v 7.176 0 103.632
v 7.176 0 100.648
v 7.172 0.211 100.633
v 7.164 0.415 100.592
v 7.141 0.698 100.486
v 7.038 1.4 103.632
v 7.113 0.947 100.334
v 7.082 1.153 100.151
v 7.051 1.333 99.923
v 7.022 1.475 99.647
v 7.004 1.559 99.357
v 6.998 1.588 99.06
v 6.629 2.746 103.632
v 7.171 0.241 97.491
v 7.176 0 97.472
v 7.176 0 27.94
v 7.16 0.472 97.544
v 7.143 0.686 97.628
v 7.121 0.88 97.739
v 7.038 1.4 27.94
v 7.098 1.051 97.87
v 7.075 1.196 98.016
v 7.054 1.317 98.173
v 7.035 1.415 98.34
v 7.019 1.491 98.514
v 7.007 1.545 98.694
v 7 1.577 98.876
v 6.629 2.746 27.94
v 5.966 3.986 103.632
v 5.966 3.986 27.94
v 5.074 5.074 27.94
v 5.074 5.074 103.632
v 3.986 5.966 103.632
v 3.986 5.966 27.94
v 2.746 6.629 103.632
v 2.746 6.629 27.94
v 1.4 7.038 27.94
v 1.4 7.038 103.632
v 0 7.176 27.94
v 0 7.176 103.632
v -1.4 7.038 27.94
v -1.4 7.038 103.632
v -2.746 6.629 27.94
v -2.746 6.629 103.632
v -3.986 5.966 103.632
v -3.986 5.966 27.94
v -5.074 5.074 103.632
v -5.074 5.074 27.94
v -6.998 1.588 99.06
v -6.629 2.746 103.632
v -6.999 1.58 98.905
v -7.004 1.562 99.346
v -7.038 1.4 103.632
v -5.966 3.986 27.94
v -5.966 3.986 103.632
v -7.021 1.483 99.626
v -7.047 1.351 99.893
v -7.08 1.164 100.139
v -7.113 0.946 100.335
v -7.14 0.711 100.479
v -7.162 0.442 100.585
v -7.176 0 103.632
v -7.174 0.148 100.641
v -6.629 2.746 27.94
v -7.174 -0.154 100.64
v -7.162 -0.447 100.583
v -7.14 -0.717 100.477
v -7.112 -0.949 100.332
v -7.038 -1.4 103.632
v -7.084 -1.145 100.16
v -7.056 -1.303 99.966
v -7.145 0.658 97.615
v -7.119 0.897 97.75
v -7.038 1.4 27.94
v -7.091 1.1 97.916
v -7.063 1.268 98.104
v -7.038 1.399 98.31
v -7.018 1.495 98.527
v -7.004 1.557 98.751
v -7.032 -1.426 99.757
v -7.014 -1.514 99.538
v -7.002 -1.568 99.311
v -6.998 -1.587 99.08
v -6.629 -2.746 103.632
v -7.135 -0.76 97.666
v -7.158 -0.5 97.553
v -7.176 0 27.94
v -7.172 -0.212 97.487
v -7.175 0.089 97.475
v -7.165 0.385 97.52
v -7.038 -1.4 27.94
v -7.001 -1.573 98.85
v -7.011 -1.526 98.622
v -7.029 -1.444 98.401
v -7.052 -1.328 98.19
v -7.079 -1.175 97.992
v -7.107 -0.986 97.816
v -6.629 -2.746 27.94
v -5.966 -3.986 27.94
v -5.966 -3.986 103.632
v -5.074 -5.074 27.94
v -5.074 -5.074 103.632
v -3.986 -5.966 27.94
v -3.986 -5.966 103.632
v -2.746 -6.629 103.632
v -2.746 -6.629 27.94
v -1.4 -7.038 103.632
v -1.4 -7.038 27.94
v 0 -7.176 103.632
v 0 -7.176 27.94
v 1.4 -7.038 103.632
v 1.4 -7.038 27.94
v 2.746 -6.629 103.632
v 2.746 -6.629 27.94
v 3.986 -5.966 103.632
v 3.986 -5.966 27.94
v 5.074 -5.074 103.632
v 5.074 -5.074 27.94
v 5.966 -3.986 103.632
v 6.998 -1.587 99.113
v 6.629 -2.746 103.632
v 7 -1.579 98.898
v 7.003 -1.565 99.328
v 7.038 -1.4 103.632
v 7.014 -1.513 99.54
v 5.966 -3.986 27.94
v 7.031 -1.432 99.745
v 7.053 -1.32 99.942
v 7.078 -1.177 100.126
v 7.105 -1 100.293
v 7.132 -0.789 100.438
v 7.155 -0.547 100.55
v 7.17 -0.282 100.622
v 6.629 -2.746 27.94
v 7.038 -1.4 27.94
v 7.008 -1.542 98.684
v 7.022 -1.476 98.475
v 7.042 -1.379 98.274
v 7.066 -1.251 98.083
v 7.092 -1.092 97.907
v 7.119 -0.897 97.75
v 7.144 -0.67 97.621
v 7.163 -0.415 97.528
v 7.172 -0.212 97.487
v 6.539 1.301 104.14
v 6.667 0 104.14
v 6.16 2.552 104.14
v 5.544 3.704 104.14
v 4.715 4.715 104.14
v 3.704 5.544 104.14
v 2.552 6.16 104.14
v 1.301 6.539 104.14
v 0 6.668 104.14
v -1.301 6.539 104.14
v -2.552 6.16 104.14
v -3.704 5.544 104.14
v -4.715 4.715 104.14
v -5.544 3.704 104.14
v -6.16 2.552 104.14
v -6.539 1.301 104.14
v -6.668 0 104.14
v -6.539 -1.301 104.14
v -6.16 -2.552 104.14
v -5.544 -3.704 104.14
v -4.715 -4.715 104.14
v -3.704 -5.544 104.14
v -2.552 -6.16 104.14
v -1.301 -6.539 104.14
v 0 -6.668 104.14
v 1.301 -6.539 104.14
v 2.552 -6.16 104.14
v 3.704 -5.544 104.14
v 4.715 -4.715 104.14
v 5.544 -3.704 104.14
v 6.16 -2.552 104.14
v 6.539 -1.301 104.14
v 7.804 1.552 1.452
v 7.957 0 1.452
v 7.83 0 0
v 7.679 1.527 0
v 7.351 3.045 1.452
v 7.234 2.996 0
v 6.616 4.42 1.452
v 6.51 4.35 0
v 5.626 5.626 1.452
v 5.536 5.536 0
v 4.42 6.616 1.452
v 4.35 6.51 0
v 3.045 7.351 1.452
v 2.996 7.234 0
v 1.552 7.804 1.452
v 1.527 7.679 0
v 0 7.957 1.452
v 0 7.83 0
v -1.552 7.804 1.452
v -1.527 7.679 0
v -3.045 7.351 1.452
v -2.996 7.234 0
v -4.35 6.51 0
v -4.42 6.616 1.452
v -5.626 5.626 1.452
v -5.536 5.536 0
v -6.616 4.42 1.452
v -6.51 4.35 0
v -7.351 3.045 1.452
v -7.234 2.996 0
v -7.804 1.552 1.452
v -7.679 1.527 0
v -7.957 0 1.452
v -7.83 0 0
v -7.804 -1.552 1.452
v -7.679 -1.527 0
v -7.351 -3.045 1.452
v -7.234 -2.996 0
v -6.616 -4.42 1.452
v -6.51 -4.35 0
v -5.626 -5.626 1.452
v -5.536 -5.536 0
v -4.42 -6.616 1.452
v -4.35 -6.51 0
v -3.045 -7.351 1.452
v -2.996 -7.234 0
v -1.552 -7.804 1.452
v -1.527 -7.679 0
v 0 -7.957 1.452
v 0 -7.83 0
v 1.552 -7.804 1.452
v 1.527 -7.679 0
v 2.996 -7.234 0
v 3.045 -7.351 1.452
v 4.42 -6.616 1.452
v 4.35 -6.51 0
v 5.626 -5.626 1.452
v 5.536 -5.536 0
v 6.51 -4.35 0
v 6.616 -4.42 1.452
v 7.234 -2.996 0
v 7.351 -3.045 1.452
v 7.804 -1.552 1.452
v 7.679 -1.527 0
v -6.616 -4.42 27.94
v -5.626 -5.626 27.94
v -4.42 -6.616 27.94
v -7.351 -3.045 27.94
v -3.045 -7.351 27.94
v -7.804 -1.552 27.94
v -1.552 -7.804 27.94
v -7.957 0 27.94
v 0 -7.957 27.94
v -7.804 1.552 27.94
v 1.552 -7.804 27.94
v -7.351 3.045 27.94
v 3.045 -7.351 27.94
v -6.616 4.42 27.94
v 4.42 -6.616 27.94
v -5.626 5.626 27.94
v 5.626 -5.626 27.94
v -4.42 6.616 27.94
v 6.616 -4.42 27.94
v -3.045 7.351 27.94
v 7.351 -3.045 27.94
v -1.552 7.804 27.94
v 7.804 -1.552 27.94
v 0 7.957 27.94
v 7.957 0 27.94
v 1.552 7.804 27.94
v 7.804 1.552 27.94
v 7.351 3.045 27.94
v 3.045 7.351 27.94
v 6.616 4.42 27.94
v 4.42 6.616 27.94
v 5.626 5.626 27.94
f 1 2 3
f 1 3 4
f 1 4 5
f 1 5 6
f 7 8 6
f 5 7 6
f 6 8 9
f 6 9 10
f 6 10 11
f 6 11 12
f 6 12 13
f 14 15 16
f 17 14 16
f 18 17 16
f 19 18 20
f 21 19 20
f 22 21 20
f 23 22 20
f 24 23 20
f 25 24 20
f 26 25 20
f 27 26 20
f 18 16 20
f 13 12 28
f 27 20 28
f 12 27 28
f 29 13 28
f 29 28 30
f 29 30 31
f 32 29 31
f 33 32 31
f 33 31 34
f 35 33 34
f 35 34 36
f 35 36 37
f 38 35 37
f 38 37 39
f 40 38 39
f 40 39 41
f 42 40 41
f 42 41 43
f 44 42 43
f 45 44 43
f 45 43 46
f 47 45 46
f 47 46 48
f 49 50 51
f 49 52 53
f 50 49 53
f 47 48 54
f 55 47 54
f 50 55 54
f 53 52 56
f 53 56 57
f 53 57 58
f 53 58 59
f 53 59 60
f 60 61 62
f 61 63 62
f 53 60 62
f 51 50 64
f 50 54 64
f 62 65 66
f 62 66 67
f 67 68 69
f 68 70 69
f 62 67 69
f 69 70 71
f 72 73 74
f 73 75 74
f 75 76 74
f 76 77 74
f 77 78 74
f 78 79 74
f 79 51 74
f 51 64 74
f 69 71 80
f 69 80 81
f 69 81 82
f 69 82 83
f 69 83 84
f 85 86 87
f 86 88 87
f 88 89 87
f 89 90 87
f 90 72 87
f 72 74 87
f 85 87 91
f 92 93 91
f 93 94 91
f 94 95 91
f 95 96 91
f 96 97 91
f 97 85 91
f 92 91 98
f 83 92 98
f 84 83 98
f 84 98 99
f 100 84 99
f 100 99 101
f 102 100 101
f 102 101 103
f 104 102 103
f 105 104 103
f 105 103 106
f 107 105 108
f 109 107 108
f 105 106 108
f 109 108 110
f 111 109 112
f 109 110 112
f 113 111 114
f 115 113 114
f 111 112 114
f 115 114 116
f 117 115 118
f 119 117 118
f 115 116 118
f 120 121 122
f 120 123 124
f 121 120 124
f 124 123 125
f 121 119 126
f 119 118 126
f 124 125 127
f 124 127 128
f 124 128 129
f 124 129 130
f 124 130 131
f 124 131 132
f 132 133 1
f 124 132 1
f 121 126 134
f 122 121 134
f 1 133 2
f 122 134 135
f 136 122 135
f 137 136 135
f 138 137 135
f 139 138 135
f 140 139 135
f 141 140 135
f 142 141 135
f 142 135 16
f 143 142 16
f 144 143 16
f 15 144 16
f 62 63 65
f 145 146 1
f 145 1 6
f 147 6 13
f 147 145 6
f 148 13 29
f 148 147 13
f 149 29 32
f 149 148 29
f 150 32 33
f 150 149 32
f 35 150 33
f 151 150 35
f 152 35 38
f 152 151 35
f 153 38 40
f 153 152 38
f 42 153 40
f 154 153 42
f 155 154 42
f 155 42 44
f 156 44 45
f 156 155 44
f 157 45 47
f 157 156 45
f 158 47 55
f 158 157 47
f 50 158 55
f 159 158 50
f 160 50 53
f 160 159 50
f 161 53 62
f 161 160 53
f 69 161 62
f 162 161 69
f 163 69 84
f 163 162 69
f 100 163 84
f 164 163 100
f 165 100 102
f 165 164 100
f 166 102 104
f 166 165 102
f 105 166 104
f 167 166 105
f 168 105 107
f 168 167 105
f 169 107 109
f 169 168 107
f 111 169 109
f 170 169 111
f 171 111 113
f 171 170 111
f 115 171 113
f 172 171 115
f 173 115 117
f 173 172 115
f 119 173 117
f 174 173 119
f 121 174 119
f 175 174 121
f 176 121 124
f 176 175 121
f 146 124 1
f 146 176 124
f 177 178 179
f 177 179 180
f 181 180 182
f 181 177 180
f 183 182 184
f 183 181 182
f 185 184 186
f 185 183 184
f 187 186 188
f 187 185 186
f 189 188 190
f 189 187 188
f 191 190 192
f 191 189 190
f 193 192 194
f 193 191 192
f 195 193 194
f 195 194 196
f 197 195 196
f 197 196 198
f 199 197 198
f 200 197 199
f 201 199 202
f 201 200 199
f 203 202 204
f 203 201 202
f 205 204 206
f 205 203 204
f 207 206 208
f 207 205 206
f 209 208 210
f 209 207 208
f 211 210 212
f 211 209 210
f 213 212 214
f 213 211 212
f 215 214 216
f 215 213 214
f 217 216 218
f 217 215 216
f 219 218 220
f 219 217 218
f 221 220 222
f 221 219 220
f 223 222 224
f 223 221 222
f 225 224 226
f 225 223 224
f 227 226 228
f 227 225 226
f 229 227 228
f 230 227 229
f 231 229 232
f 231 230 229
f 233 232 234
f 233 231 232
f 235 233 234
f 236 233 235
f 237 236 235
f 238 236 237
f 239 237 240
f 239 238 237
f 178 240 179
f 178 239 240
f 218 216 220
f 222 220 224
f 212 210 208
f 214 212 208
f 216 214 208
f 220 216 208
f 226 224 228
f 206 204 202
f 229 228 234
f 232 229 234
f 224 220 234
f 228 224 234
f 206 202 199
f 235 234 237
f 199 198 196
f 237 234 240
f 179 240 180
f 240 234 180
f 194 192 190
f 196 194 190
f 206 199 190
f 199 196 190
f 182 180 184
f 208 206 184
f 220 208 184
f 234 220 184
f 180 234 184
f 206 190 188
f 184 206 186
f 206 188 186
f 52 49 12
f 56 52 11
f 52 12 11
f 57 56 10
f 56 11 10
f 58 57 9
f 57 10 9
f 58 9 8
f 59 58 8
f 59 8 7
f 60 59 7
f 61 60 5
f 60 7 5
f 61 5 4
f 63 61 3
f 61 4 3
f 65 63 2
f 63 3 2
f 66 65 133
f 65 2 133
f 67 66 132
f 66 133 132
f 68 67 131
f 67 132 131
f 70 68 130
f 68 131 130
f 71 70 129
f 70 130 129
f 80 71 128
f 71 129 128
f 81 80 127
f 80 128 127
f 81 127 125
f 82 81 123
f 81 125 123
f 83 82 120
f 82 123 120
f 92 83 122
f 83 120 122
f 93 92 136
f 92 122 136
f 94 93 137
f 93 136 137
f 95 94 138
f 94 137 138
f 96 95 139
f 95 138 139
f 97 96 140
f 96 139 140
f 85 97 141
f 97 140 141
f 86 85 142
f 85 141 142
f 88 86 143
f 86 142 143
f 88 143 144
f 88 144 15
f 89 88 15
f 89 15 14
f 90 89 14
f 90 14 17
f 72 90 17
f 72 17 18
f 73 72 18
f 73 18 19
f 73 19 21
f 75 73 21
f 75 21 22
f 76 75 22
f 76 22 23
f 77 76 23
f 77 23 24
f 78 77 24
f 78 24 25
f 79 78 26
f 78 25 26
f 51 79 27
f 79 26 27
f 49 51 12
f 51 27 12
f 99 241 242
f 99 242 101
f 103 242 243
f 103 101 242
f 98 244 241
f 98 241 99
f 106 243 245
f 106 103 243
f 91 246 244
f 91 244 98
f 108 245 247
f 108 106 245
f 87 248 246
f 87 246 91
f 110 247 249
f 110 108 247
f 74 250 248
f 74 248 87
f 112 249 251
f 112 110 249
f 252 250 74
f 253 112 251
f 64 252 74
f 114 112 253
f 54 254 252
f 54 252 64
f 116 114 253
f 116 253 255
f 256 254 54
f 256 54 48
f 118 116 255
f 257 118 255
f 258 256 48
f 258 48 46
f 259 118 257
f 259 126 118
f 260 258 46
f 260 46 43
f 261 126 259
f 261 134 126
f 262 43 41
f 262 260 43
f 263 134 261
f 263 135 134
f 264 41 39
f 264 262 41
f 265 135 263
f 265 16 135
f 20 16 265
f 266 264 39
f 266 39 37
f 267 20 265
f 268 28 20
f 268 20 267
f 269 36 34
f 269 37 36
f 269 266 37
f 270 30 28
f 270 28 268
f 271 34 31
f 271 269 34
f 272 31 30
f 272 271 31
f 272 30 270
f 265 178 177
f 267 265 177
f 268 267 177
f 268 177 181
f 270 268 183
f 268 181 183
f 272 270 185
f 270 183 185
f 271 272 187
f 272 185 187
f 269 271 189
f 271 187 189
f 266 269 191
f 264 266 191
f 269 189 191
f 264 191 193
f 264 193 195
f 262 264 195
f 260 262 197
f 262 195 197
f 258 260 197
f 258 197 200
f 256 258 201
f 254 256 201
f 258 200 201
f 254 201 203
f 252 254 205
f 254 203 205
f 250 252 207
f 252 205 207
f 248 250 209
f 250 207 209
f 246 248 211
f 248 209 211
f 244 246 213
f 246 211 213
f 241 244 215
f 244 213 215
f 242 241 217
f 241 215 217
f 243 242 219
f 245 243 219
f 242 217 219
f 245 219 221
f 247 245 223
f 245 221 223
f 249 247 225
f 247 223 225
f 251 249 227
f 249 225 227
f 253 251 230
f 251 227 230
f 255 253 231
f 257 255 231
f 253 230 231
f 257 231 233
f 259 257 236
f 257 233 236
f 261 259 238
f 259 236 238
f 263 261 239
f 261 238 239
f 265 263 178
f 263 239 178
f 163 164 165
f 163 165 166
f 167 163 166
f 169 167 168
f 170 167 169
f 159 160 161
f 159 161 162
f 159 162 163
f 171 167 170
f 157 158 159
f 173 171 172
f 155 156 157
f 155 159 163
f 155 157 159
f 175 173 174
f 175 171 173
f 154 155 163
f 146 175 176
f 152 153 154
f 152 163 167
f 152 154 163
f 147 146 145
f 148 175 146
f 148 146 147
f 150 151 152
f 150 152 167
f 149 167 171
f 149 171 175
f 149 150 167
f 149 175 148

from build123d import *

# Parameters (mm, degrees)
F0_R     = 7.95655
F1_DEPTH = 27.94
F2_R     = 7.1755
F3_DEPTH = 76.2
F5_R     = 1.5875
F6_DEPTH = 12.7
F7_SIZE  = 0.508
F8_SIZE2 = 1.4516166425
F8_SIZE  = 0.127


with BuildPart() as f1:
    # F0 (on Top) → F1 (new body)
    with BuildSketch(Plane.XY):
        Circle(F0_R)
    extrude(amount=F1_DEPTH)

    # F2 (on face) → F3 (join)
    with BuildSketch(Plane.XY.offset(27.94)):
        Circle(F2_R)
    extrude(amount=F3_DEPTH)

    # F5 (on face) → F6 (cut, symmetric)
    with BuildSketch(Plane.YZ):
        with Locations((0, 99.06)):
            Circle(F5_R)
    extrude(amount=F6_DEPTH, both=True, mode=Mode.SUBTRACT)

    # F7
    f7_edges = [f1.edges().sort_by_distance(p)[0] for p in [
        (-7.1755, 0, 104.14),
    ]]
    chamfer(f7_edges, length=F7_SIZE)

    # F8
    f8_edges = [f1.edges().sort_by_distance(p)[0] for p in [
        (-7.95655, 0, 0),
    ]]
    f8_side = f1.faces().sort_by_distance((0, 0, 0))[0]
    chamfer(f8_edges, length=F8_SIZE, length2=F8_SIZE2, reference=f8_side)


solid = f1.part
